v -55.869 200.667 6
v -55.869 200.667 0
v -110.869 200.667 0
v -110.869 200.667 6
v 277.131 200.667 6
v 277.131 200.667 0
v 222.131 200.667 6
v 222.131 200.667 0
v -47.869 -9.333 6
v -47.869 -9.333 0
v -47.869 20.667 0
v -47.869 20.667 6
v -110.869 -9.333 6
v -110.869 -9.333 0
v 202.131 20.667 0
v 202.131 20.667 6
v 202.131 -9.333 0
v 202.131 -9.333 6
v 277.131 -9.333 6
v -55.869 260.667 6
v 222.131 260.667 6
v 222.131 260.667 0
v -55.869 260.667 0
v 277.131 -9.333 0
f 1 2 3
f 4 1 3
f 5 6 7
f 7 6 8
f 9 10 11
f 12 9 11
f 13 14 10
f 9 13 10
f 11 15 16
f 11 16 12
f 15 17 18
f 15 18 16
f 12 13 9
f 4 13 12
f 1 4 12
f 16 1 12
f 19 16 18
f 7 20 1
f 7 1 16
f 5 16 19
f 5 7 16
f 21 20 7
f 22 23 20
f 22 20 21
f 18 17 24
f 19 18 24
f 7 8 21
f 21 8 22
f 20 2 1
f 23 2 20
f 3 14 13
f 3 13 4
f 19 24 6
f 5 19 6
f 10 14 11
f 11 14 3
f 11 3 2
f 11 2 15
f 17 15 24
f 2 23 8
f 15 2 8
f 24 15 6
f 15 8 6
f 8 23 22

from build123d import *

# Parameters (mm, degrees)
SKETCH1_W           = 388
SKETCH1_H           = 270
BOSS_EXTRUDE1_DEPTH = 6
SKETCH2_W           = 55
SKETCH2_H           = 60
CUT_EXTRUDE1_DEPTH  = 40
SKETCH3_W           = 250
SKETCH3_H           = 30
CUT_EXTRUDE2_DEPTH  = 10


with BuildPart() as part:
    # Sketch1 → Boss-Extrude1 (new body)
    with BuildSketch(Plane.XY):
        with Locations((83.131383381, 125.666802076)):
            Rectangle(SKETCH1_W, SKETCH1_H)
    extrude(amount=BOSS_EXTRUDE1_DEPTH)

    # Sketch2 → Cut-Extrude1 (cut)
    with BuildSketch(Plane(origin=(0, 0, 0), x_dir=(-1, 0, 0), z_dir=(0, 0, -1))):
        with Locations((-249.631383381, 230.666802076)):
            Rectangle(SKETCH2_W, SKETCH2_H)
        with Locations((83.368616619, 230.666802076)):
            Rectangle(SKETCH2_W, SKETCH2_H)
    extrude(amount=-CUT_EXTRUDE1_DEPTH, mode=Mode.SUBTRACT)

    # Sketch3 → Cut-Extrude2 (cut)
    with BuildSketch(Plane(origin=(0, 0, 0), x_dir=(-1, 0, 0), z_dir=(0, 0, -1))):
        with Locations((-77.131383381, 5.666802076)):
            Rectangle(SKETCH3_W, SKETCH3_H)
    extrude(amount=-CUT_EXTRUDE2_DEPTH, mode=Mode.SUBTRACT)


solid = part.part
